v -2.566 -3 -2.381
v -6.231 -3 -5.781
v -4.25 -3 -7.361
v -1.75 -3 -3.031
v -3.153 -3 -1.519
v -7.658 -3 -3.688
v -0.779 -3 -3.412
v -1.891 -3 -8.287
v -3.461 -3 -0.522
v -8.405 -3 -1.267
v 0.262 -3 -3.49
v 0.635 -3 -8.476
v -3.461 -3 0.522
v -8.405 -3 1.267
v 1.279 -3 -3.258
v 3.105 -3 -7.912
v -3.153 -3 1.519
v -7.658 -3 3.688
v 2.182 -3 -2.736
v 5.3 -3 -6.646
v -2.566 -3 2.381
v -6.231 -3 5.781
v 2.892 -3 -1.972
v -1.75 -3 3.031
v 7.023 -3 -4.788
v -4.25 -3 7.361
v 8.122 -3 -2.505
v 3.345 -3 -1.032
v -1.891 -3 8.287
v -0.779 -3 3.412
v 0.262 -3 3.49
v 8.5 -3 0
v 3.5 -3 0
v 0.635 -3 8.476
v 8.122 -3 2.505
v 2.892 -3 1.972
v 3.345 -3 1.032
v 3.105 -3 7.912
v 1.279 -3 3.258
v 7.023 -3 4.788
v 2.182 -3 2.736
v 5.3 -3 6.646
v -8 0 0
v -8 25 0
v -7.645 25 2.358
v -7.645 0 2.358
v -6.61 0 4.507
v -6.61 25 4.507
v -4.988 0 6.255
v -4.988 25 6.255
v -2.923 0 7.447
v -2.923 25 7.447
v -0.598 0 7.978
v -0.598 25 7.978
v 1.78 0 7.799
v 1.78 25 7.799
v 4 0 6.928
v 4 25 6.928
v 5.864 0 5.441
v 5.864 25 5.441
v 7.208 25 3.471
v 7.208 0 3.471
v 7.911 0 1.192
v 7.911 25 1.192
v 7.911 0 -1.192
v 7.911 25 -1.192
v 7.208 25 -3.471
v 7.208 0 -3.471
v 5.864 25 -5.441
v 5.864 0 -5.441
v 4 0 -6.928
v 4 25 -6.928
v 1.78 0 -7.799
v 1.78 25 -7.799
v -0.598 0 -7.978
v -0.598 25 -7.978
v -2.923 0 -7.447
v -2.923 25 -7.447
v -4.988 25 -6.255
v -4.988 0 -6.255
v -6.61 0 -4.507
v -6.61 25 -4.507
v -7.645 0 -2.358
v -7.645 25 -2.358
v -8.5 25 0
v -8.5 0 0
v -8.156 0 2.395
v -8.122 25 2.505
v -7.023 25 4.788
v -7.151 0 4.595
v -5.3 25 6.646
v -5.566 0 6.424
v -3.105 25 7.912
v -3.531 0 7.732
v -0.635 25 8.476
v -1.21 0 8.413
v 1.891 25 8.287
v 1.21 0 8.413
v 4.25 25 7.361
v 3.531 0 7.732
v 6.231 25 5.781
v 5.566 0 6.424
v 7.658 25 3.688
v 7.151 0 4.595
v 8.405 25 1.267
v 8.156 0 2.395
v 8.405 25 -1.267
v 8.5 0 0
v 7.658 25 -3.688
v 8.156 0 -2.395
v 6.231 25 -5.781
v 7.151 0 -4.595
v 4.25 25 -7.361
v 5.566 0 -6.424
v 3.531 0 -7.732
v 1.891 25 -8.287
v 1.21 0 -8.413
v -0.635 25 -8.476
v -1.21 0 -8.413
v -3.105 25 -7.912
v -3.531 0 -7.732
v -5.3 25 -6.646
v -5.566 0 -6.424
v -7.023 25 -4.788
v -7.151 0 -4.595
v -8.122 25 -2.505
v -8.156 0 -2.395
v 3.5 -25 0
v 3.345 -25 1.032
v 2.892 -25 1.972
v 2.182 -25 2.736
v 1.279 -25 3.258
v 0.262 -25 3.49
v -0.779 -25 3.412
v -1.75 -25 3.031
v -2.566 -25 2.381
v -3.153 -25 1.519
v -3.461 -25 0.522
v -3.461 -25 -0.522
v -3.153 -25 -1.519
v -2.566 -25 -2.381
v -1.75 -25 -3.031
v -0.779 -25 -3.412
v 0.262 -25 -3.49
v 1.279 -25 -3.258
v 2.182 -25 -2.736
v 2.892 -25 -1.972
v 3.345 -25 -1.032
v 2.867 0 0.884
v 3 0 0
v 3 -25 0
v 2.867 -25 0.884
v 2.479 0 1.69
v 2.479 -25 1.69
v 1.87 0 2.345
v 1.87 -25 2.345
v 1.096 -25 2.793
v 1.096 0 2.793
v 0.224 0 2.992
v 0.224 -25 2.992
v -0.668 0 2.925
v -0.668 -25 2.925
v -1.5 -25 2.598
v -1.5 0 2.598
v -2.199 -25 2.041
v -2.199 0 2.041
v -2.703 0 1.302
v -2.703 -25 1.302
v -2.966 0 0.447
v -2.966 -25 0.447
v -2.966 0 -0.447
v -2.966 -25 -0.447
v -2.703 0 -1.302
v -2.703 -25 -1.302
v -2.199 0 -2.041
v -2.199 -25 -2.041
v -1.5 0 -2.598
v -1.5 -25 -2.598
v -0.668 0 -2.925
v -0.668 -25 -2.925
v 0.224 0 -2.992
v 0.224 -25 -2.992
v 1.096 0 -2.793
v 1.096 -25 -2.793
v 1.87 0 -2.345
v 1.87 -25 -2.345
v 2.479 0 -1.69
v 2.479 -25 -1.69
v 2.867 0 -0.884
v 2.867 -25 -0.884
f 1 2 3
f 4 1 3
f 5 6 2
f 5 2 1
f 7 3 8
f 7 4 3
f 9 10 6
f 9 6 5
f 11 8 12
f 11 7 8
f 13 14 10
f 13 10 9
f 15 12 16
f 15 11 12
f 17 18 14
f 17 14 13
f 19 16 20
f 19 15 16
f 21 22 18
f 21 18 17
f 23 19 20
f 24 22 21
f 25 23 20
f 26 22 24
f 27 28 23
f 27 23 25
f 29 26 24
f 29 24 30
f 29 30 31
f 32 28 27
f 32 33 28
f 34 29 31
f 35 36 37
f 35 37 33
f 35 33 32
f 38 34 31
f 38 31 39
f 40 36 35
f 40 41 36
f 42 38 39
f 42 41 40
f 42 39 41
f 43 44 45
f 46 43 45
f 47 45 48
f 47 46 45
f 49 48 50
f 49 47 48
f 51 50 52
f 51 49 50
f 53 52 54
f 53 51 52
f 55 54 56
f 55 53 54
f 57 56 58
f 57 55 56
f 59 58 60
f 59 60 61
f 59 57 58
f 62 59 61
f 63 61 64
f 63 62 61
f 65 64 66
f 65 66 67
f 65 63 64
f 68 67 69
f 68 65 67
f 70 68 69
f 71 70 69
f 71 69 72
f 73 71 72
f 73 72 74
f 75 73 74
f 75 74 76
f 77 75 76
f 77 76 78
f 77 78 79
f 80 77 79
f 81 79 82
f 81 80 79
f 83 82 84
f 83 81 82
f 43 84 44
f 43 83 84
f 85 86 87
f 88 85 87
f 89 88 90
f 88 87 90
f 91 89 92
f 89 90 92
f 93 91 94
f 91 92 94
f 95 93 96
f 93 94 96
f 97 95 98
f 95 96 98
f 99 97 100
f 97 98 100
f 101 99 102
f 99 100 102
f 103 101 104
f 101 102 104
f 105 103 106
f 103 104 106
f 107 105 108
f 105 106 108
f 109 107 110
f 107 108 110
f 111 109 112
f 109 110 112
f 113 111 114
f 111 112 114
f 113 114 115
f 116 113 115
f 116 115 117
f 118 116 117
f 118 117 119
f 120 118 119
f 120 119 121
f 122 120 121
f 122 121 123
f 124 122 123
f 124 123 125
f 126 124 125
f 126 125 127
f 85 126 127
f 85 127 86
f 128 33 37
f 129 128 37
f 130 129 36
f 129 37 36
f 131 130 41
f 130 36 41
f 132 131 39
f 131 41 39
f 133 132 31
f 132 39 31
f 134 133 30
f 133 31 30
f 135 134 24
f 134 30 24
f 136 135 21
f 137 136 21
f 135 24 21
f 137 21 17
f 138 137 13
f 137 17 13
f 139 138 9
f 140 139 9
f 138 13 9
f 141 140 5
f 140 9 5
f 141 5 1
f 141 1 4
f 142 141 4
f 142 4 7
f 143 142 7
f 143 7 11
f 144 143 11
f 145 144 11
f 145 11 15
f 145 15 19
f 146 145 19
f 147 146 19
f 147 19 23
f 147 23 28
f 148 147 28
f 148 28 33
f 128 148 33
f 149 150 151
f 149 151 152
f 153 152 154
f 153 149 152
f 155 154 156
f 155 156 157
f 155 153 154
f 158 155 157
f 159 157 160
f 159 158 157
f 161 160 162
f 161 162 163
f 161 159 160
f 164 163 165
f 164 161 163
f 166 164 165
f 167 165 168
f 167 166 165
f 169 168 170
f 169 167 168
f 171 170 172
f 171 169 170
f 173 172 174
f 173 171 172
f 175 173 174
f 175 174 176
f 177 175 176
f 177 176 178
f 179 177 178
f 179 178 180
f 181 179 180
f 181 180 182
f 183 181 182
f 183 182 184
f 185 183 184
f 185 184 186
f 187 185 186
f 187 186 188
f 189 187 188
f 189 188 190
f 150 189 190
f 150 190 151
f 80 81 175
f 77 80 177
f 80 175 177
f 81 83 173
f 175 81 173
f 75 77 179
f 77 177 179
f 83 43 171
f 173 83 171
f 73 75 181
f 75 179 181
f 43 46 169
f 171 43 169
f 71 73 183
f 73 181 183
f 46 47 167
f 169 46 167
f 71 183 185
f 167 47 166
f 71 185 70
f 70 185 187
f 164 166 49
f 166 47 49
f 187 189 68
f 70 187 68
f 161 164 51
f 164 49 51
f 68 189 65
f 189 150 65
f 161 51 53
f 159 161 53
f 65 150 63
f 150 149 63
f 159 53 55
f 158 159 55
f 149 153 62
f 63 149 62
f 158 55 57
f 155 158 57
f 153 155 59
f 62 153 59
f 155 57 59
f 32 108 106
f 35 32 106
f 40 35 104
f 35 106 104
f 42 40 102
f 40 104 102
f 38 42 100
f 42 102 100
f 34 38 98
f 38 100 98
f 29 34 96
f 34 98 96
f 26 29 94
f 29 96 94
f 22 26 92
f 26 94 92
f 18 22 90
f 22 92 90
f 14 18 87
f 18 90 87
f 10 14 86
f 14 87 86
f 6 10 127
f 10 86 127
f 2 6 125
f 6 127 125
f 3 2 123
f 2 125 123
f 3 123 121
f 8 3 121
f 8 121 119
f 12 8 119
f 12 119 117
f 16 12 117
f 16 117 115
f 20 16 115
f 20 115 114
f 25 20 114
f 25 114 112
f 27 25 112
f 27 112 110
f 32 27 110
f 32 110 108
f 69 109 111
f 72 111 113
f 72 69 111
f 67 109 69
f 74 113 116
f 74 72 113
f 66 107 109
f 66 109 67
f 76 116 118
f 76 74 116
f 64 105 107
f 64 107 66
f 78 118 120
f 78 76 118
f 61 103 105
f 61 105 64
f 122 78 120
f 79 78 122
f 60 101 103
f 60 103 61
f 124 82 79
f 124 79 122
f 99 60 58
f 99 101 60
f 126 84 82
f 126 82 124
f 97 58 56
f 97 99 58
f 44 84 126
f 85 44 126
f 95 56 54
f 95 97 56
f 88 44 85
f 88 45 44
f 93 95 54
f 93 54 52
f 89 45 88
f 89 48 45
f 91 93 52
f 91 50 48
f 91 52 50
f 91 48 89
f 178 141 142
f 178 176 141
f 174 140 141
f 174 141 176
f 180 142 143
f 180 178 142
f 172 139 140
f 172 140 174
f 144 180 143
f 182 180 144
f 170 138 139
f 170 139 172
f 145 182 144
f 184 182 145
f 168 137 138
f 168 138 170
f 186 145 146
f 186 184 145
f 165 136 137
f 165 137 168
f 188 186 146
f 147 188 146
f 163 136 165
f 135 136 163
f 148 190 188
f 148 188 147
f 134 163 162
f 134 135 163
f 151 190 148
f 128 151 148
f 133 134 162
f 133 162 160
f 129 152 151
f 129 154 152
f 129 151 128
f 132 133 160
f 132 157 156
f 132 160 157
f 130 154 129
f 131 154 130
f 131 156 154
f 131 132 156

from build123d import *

# Parameters (mm, degrees)
F0_R     = 3.5
F0_R_2   = 3
F1_DEPTH = 25
F2_R     = 8.5
F2_R_2   = 3
F3_DEPTH = 3
F4_R     = 8.5
F4_R_2   = 8
F5_DEPTH = 25


with BuildPart() as f1:
    # F0 (on Front) → F1 (new body)
    with BuildSketch(Plane.XZ):
        Circle(F0_R)
        Circle(F0_R_2, mode=Mode.SUBTRACT)
    extrude(amount=F1_DEPTH)

    # F2 (on Front) → F3 (join)
    with BuildSketch(Plane.XZ):
        Circle(F2_R)
        Circle(F2_R_2, mode=Mode.SUBTRACT)
    extrude(amount=F3_DEPTH)

    # F4 (on face) → F5 (join)
    with BuildSketch(Plane(origin=(0, 0, 0), x_dir=(-1, 0, 0), z_dir=(0, 1, 0))):
        Circle(F4_R)
        Circle(F4_R_2, mode=Mode.SUBTRACT)
    extrude(amount=F5_DEPTH)


solid = f1.part
